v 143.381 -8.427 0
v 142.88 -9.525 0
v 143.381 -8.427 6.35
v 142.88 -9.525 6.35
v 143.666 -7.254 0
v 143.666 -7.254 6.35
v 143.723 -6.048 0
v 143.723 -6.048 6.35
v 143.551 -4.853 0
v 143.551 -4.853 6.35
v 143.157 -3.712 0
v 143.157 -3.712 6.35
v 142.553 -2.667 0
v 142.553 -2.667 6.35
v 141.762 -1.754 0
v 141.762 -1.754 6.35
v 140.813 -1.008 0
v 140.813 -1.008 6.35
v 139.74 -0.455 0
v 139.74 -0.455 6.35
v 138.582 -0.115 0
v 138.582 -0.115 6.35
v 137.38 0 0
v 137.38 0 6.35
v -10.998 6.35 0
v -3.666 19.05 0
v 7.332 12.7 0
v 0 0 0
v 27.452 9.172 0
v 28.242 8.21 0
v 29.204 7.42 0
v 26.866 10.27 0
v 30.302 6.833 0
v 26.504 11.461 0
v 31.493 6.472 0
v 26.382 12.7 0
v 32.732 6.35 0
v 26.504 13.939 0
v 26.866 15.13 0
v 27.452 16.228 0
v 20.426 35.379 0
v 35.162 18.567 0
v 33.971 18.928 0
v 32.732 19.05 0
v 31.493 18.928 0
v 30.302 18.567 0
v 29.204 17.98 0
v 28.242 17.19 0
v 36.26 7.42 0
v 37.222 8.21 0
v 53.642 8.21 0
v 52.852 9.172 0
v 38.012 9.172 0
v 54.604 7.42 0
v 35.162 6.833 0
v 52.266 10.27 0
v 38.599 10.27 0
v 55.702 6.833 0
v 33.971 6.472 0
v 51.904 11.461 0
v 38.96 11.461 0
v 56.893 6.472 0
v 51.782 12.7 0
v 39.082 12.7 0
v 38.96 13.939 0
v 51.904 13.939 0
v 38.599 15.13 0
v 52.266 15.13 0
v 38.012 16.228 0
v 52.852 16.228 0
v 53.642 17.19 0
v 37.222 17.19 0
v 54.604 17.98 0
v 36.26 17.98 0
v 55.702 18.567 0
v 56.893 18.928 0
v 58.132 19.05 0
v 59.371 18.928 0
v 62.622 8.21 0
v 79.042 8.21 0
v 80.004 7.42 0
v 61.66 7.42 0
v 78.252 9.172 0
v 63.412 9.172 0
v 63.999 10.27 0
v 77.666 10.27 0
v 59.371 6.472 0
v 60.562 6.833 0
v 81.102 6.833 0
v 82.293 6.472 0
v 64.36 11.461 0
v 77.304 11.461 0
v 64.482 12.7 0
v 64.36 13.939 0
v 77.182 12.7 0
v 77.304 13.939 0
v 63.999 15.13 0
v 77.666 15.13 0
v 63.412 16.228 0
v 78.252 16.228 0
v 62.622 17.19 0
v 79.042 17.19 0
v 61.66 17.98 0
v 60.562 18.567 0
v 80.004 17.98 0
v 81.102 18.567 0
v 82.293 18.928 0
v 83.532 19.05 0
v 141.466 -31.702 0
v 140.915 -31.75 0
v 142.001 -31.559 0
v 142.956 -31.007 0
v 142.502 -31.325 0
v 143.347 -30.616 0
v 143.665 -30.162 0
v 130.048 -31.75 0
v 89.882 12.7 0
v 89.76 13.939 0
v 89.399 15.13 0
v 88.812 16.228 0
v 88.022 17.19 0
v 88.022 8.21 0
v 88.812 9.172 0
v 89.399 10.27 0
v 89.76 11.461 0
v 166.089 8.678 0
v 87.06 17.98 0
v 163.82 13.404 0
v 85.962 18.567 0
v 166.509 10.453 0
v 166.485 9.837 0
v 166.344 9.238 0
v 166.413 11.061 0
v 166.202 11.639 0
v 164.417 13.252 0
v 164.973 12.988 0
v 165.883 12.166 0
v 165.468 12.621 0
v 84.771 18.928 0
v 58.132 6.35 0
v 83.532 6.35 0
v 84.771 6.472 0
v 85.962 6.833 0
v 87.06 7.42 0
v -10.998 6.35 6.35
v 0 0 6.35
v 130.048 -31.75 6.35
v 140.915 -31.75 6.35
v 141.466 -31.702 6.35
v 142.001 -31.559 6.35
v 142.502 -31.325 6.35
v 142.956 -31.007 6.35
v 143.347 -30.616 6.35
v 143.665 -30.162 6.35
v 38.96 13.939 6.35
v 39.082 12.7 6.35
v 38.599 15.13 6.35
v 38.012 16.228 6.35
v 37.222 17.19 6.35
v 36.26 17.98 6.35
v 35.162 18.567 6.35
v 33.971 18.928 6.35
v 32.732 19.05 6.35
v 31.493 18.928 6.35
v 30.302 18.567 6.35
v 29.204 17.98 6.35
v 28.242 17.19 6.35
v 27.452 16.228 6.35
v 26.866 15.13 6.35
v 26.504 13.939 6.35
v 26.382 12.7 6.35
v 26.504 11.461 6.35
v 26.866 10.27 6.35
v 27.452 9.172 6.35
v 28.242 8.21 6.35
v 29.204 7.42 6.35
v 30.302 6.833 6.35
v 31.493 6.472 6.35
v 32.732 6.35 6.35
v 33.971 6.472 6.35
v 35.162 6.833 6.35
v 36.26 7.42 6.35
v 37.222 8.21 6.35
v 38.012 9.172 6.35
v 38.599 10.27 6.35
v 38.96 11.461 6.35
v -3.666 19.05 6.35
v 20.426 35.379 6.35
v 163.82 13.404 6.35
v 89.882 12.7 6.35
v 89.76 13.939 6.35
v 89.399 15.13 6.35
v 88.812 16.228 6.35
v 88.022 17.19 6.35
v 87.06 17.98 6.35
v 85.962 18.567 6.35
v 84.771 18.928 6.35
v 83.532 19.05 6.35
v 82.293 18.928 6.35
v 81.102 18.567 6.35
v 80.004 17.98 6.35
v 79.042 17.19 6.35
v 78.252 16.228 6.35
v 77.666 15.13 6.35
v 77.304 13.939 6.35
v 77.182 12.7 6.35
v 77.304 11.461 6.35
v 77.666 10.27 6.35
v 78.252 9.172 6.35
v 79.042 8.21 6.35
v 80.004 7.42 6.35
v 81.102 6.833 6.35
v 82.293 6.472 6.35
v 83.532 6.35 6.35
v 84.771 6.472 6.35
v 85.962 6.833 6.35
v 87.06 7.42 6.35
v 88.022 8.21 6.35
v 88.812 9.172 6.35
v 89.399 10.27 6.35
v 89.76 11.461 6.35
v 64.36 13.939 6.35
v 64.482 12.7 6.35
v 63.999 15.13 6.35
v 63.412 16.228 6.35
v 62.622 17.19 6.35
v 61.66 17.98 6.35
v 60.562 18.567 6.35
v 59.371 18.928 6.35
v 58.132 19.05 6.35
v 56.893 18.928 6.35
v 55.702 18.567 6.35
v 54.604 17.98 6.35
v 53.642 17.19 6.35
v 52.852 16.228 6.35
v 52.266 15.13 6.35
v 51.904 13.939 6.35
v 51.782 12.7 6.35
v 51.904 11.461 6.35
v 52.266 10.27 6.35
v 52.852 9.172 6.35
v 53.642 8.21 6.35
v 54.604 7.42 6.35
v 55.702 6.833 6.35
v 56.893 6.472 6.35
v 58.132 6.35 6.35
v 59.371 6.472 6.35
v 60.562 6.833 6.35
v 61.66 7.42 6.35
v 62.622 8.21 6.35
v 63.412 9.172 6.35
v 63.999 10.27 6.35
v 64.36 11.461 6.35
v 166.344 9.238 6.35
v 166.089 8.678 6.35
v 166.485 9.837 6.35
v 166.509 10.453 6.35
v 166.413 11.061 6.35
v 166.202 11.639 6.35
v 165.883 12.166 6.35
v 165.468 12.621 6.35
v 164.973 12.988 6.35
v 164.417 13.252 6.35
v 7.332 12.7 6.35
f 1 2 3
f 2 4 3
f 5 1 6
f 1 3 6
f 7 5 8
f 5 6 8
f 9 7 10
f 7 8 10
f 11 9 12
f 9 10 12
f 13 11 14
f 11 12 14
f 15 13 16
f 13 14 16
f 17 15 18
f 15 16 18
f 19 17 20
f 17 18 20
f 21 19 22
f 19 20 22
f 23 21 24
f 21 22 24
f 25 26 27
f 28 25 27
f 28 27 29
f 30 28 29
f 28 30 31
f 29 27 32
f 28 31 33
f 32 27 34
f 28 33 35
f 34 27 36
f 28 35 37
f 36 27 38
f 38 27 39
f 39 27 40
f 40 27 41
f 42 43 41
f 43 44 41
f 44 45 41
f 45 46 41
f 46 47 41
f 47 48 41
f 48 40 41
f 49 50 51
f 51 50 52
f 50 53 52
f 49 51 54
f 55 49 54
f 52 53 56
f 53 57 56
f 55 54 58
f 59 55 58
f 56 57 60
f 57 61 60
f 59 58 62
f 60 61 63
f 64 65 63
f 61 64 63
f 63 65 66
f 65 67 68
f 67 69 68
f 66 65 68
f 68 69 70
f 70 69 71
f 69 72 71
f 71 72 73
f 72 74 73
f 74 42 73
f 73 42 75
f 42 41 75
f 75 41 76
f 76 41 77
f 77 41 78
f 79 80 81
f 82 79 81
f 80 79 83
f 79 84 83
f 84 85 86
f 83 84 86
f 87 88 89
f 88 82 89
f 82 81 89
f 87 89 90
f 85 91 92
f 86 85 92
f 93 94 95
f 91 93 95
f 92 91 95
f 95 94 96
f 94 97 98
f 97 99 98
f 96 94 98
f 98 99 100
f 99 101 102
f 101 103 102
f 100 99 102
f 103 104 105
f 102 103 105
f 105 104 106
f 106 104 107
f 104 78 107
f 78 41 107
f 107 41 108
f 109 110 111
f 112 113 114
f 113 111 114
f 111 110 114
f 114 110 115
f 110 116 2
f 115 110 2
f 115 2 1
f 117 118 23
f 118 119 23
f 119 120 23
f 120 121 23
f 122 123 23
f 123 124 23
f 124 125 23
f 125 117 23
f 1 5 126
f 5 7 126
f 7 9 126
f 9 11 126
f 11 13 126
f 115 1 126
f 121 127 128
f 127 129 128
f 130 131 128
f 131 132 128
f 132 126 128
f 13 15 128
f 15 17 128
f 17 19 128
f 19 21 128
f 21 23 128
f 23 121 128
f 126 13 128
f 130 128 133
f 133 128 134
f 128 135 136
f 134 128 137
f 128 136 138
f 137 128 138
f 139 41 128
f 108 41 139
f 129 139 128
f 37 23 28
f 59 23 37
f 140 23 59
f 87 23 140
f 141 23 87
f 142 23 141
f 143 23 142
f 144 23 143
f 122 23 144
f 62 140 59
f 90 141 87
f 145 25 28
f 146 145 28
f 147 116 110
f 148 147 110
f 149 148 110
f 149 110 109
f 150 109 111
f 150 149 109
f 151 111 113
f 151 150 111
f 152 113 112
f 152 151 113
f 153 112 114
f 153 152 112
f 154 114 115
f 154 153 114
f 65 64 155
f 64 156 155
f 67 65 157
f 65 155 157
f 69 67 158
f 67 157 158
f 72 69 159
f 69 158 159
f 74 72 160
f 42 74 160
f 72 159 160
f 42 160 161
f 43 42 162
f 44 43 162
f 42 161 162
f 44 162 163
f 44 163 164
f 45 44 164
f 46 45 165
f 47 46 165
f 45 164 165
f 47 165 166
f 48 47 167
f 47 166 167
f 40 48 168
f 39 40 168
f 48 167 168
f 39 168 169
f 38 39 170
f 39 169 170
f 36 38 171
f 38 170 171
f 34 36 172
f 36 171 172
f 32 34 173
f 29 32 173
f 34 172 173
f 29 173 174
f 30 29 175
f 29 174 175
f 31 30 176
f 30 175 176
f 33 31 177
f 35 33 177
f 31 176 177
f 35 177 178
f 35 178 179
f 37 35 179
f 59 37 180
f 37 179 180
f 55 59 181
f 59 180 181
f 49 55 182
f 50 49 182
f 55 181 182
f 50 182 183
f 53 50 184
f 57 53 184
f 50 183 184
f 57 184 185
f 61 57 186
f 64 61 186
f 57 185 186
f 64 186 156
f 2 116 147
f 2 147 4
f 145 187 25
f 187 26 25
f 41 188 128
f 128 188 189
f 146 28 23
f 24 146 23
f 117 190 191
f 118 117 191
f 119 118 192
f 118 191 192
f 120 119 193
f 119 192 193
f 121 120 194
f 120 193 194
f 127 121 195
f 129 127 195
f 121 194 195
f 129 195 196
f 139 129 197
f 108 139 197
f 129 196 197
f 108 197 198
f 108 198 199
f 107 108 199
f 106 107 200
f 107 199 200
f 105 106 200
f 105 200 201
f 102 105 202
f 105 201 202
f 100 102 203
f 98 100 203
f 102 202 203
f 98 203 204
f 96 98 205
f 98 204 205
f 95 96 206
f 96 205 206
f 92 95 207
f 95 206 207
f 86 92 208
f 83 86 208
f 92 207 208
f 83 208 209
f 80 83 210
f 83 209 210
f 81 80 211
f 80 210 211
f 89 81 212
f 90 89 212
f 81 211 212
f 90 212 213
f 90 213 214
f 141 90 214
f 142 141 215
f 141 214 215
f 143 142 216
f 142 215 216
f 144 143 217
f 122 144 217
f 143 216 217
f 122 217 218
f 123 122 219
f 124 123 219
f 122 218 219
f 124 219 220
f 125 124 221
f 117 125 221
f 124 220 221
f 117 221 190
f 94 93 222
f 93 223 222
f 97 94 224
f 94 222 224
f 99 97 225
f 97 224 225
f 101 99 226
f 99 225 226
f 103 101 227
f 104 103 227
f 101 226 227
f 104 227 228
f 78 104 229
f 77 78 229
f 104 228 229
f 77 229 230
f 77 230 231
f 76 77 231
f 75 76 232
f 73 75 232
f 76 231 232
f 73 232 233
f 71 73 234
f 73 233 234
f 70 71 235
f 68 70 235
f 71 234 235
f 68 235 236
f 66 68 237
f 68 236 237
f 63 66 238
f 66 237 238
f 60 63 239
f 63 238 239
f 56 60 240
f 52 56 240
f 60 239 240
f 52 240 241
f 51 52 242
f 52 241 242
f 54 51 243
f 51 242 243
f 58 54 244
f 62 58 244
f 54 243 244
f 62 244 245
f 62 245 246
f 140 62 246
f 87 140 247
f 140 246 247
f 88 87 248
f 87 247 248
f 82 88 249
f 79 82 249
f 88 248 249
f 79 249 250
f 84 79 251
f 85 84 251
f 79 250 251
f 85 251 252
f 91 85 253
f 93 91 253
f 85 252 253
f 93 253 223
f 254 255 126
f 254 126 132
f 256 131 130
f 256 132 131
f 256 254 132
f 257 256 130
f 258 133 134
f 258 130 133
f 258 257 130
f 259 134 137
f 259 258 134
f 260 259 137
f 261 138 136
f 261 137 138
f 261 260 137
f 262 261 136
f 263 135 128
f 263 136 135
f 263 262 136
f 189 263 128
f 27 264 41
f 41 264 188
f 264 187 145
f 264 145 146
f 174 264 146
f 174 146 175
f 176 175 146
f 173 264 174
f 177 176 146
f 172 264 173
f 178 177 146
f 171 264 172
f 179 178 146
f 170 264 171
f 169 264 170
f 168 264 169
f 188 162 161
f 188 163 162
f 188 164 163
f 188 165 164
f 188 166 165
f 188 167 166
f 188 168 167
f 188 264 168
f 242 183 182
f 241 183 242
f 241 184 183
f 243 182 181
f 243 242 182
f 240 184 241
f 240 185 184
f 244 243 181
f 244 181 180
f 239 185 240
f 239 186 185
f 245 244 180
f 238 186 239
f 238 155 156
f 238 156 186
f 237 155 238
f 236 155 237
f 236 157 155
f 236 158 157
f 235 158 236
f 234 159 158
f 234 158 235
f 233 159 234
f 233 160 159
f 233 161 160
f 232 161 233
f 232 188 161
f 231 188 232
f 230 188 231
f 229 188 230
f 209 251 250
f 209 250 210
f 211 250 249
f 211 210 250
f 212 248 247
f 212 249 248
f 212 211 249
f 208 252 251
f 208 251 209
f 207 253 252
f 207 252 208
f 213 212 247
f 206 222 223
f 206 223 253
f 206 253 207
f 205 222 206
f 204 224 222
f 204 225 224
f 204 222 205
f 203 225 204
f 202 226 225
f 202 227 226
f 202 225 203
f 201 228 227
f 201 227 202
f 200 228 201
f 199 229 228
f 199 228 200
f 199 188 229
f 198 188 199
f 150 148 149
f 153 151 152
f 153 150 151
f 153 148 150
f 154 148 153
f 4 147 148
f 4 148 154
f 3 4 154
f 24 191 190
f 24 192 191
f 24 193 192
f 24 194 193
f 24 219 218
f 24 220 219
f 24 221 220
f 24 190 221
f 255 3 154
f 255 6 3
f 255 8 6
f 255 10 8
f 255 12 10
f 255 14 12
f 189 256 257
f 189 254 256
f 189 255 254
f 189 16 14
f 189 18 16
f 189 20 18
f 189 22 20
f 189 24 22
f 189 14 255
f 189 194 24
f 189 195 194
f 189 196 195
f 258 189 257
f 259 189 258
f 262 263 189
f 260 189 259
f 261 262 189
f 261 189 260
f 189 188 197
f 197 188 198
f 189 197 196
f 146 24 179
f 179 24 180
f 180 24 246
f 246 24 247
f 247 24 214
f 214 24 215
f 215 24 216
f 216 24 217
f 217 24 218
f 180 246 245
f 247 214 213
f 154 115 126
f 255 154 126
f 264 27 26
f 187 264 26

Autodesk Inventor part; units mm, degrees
ref_plane "YZ Plane" through (0, 0, 0) normal (1, 0, 0) x (0, 1, 0)
ref_plane "XZ Plane" through (0, 0, 0) normal (0, 1, 0) x (-1, 0, 0)
ref_plane "XY Plane" through (0, 0, 0) normal (0, 0, 1) x (1, 0, 0)
sketch "Sketch1" plane through (0, 0, 0) normal (0, 0, 1) x (1, 0, 0)
  line L0 (0, 0) -> (130.048, 0)
  line L1 (87.9024, 12.7) -> (7.3323, 12.7)
  line L2 (87.9024, 12.7) -> (130.048, 12.7)
  line L3 (130.048, 12.7) -> (130.048, 0)
  line L4 (130.048, -31.75) -> (142.748, -31.75)
  line L5 (130.048, -31.75) -> (148.3789, 0)
  line L6 (142.748, -31.75) -> (168.4112, 12.7)
  line L7 (148.3789, 0) -> (130.048, 0)
  line L8 (130.048, 12.7) -> (168.4112, 12.7)
  line L9 (7.3323, 12.7) -> (-3.6662, 19.05)
  line L10 (-3.6662, 19.05) -> (-10.9985, 6.35)
  line L11 (-10.9985, 6.35) -> (0, 0)
  dimension "d4" = 130.048
  dimension "d7" = 31.75
  dimension "d8" = 12.7
  dimension "d9" = 60
  dimension "d10" = 60
  dimension "d11" = 12.7
  dimension "d14" = 12.7
  dimension "d15" = 10.9985
  dimension "d16" = 14.6647
  dimension "d17" = 150
  dimension "d18" = 150
extrude "Extrusion1" add sketch "Sketch1" along normal blind 6.35
sketch "Sketch2" plane through (0, 0, 6.35) normal (0, 0, 1) x (1, 0, 0)
  line L0 (168.4112, 12.7) -> (7.3323, 12.7) projected
  line L1 (-10.9985, 6.35) -> (0, 0) projected
  line L2 (7.3323, 12.7) -> (20.426, 35.379)
  line L3 (20.426, 35.379) -> (168.4112, 12.7)
  dimension "d19" = 26.1874
extrude "Extrusion2" add sketch "Sketch2" against normal blind 6.35
fillet "Fillet1" radius 3.175 1 edges at (168.4112, 12.7, 3.175)
fillet "Fillet2" radius 3.175 1 edges at (142.748, -31.75, 3.175)
sketch "Sketch3" plane through (0, 0, 6.35) normal (0, 0, 1) x (1, 0, 0)
  circle A0 centre (32.7323, 12.7) radius 6.35
  circle A1 centre (58.1323, 12.7) radius 6.35
  circle A2 centre (83.5323, 12.7) radius 6.35
  dimension "d26" = 12.7
  dimension "d28" = 12.7
  dimension "d30" = 12.7
extrude "Extrusion3" cut sketch "Sketch3" against normal blind 6.35
fillet "Fillet4" radius 6.35 1 edges at (148.3789, 0, 3.175)
properties part number "hook" material "Steel"
